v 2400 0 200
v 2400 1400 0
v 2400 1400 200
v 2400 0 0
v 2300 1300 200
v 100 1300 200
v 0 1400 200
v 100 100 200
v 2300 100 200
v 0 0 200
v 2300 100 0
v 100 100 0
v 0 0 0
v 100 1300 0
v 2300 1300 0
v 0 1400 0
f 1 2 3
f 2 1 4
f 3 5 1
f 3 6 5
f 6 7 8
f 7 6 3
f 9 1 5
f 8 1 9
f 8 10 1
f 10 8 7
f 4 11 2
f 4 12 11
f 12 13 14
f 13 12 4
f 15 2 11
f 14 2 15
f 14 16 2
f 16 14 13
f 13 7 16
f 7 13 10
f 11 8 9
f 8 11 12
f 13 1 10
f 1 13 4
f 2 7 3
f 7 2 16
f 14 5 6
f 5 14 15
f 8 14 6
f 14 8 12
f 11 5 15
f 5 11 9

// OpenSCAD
// Generated from plan.json; millimetres. Not a structural design.
// Open in OpenSCAD. Increase explode_mm to inspect courses.
explode_mm = 0;
$fn = 24;
show_fixing_paths = false;

// offer-bed-01-C1-S
translate([0, 0, 0+0*explode_mm])
  color([0.70,0.52,0.33]) cube([2400, 100, 200]);
// offer-bed-01-C1-N
translate([0, 1300, 0+0*explode_mm])
  color([0.70,0.52,0.33]) cube([2400, 100, 200]);
// offer-bed-01-C1-W
translate([0, 100, 0+0*explode_mm])
  color([0.70,0.52,0.33]) cube([100, 1200, 200]);
// offer-bed-01-C1-E
translate([2300, 100, 0+0*explode_mm])
  color([0.70,0.52,0.33]) cube([100, 1200, 200]);
if (show_fixing_paths) translate([50.0, 1400, 50.0+0*explode_mm]) rotate([90,0,0]) color([0.8,0.1,0.1]) cylinder(d=7, h=150);
if (show_fixing_paths) translate([50.0, 1400, 150.0+0*explode_mm]) rotate([90,0,0]) color([0.8,0.1,0.1]) cylinder(d=7, h=150);
if (show_fixing_paths) translate([2350.0, 1400, 50.0+0*explode_mm]) rotate([90,0,0]) color([0.8,0.1,0.1]) cylinder(d=7, h=150);
if (show_fixing_paths) translate([2350.0, 1400, 150.0+0*explode_mm]) rotate([90,0,0]) color([0.8,0.1,0.1]) cylinder(d=7, h=150);
if (show_fixing_paths) translate([50.0, 0, 50.0+0*explode_mm]) rotate([-90,0,0]) color([0.8,0.1,0.1]) cylinder(d=7, h=150);
if (show_fixing_paths) translate([50.0, 0, 150.0+0*explode_mm]) rotate([-90,0,0]) color([0.8,0.1,0.1]) cylinder(d=7, h=150);
if (show_fixing_paths) translate([2350.0, 0, 50.0+0*explode_mm]) rotate([-90,0,0]) color([0.8,0.1,0.1]) cylinder(d=7, h=150);
if (show_fixing_paths) translate([2350.0, 0, 150.0+0*explode_mm]) rotate([-90,0,0]) color([0.8,0.1,0.1]) cylinder(d=7, h=150);
